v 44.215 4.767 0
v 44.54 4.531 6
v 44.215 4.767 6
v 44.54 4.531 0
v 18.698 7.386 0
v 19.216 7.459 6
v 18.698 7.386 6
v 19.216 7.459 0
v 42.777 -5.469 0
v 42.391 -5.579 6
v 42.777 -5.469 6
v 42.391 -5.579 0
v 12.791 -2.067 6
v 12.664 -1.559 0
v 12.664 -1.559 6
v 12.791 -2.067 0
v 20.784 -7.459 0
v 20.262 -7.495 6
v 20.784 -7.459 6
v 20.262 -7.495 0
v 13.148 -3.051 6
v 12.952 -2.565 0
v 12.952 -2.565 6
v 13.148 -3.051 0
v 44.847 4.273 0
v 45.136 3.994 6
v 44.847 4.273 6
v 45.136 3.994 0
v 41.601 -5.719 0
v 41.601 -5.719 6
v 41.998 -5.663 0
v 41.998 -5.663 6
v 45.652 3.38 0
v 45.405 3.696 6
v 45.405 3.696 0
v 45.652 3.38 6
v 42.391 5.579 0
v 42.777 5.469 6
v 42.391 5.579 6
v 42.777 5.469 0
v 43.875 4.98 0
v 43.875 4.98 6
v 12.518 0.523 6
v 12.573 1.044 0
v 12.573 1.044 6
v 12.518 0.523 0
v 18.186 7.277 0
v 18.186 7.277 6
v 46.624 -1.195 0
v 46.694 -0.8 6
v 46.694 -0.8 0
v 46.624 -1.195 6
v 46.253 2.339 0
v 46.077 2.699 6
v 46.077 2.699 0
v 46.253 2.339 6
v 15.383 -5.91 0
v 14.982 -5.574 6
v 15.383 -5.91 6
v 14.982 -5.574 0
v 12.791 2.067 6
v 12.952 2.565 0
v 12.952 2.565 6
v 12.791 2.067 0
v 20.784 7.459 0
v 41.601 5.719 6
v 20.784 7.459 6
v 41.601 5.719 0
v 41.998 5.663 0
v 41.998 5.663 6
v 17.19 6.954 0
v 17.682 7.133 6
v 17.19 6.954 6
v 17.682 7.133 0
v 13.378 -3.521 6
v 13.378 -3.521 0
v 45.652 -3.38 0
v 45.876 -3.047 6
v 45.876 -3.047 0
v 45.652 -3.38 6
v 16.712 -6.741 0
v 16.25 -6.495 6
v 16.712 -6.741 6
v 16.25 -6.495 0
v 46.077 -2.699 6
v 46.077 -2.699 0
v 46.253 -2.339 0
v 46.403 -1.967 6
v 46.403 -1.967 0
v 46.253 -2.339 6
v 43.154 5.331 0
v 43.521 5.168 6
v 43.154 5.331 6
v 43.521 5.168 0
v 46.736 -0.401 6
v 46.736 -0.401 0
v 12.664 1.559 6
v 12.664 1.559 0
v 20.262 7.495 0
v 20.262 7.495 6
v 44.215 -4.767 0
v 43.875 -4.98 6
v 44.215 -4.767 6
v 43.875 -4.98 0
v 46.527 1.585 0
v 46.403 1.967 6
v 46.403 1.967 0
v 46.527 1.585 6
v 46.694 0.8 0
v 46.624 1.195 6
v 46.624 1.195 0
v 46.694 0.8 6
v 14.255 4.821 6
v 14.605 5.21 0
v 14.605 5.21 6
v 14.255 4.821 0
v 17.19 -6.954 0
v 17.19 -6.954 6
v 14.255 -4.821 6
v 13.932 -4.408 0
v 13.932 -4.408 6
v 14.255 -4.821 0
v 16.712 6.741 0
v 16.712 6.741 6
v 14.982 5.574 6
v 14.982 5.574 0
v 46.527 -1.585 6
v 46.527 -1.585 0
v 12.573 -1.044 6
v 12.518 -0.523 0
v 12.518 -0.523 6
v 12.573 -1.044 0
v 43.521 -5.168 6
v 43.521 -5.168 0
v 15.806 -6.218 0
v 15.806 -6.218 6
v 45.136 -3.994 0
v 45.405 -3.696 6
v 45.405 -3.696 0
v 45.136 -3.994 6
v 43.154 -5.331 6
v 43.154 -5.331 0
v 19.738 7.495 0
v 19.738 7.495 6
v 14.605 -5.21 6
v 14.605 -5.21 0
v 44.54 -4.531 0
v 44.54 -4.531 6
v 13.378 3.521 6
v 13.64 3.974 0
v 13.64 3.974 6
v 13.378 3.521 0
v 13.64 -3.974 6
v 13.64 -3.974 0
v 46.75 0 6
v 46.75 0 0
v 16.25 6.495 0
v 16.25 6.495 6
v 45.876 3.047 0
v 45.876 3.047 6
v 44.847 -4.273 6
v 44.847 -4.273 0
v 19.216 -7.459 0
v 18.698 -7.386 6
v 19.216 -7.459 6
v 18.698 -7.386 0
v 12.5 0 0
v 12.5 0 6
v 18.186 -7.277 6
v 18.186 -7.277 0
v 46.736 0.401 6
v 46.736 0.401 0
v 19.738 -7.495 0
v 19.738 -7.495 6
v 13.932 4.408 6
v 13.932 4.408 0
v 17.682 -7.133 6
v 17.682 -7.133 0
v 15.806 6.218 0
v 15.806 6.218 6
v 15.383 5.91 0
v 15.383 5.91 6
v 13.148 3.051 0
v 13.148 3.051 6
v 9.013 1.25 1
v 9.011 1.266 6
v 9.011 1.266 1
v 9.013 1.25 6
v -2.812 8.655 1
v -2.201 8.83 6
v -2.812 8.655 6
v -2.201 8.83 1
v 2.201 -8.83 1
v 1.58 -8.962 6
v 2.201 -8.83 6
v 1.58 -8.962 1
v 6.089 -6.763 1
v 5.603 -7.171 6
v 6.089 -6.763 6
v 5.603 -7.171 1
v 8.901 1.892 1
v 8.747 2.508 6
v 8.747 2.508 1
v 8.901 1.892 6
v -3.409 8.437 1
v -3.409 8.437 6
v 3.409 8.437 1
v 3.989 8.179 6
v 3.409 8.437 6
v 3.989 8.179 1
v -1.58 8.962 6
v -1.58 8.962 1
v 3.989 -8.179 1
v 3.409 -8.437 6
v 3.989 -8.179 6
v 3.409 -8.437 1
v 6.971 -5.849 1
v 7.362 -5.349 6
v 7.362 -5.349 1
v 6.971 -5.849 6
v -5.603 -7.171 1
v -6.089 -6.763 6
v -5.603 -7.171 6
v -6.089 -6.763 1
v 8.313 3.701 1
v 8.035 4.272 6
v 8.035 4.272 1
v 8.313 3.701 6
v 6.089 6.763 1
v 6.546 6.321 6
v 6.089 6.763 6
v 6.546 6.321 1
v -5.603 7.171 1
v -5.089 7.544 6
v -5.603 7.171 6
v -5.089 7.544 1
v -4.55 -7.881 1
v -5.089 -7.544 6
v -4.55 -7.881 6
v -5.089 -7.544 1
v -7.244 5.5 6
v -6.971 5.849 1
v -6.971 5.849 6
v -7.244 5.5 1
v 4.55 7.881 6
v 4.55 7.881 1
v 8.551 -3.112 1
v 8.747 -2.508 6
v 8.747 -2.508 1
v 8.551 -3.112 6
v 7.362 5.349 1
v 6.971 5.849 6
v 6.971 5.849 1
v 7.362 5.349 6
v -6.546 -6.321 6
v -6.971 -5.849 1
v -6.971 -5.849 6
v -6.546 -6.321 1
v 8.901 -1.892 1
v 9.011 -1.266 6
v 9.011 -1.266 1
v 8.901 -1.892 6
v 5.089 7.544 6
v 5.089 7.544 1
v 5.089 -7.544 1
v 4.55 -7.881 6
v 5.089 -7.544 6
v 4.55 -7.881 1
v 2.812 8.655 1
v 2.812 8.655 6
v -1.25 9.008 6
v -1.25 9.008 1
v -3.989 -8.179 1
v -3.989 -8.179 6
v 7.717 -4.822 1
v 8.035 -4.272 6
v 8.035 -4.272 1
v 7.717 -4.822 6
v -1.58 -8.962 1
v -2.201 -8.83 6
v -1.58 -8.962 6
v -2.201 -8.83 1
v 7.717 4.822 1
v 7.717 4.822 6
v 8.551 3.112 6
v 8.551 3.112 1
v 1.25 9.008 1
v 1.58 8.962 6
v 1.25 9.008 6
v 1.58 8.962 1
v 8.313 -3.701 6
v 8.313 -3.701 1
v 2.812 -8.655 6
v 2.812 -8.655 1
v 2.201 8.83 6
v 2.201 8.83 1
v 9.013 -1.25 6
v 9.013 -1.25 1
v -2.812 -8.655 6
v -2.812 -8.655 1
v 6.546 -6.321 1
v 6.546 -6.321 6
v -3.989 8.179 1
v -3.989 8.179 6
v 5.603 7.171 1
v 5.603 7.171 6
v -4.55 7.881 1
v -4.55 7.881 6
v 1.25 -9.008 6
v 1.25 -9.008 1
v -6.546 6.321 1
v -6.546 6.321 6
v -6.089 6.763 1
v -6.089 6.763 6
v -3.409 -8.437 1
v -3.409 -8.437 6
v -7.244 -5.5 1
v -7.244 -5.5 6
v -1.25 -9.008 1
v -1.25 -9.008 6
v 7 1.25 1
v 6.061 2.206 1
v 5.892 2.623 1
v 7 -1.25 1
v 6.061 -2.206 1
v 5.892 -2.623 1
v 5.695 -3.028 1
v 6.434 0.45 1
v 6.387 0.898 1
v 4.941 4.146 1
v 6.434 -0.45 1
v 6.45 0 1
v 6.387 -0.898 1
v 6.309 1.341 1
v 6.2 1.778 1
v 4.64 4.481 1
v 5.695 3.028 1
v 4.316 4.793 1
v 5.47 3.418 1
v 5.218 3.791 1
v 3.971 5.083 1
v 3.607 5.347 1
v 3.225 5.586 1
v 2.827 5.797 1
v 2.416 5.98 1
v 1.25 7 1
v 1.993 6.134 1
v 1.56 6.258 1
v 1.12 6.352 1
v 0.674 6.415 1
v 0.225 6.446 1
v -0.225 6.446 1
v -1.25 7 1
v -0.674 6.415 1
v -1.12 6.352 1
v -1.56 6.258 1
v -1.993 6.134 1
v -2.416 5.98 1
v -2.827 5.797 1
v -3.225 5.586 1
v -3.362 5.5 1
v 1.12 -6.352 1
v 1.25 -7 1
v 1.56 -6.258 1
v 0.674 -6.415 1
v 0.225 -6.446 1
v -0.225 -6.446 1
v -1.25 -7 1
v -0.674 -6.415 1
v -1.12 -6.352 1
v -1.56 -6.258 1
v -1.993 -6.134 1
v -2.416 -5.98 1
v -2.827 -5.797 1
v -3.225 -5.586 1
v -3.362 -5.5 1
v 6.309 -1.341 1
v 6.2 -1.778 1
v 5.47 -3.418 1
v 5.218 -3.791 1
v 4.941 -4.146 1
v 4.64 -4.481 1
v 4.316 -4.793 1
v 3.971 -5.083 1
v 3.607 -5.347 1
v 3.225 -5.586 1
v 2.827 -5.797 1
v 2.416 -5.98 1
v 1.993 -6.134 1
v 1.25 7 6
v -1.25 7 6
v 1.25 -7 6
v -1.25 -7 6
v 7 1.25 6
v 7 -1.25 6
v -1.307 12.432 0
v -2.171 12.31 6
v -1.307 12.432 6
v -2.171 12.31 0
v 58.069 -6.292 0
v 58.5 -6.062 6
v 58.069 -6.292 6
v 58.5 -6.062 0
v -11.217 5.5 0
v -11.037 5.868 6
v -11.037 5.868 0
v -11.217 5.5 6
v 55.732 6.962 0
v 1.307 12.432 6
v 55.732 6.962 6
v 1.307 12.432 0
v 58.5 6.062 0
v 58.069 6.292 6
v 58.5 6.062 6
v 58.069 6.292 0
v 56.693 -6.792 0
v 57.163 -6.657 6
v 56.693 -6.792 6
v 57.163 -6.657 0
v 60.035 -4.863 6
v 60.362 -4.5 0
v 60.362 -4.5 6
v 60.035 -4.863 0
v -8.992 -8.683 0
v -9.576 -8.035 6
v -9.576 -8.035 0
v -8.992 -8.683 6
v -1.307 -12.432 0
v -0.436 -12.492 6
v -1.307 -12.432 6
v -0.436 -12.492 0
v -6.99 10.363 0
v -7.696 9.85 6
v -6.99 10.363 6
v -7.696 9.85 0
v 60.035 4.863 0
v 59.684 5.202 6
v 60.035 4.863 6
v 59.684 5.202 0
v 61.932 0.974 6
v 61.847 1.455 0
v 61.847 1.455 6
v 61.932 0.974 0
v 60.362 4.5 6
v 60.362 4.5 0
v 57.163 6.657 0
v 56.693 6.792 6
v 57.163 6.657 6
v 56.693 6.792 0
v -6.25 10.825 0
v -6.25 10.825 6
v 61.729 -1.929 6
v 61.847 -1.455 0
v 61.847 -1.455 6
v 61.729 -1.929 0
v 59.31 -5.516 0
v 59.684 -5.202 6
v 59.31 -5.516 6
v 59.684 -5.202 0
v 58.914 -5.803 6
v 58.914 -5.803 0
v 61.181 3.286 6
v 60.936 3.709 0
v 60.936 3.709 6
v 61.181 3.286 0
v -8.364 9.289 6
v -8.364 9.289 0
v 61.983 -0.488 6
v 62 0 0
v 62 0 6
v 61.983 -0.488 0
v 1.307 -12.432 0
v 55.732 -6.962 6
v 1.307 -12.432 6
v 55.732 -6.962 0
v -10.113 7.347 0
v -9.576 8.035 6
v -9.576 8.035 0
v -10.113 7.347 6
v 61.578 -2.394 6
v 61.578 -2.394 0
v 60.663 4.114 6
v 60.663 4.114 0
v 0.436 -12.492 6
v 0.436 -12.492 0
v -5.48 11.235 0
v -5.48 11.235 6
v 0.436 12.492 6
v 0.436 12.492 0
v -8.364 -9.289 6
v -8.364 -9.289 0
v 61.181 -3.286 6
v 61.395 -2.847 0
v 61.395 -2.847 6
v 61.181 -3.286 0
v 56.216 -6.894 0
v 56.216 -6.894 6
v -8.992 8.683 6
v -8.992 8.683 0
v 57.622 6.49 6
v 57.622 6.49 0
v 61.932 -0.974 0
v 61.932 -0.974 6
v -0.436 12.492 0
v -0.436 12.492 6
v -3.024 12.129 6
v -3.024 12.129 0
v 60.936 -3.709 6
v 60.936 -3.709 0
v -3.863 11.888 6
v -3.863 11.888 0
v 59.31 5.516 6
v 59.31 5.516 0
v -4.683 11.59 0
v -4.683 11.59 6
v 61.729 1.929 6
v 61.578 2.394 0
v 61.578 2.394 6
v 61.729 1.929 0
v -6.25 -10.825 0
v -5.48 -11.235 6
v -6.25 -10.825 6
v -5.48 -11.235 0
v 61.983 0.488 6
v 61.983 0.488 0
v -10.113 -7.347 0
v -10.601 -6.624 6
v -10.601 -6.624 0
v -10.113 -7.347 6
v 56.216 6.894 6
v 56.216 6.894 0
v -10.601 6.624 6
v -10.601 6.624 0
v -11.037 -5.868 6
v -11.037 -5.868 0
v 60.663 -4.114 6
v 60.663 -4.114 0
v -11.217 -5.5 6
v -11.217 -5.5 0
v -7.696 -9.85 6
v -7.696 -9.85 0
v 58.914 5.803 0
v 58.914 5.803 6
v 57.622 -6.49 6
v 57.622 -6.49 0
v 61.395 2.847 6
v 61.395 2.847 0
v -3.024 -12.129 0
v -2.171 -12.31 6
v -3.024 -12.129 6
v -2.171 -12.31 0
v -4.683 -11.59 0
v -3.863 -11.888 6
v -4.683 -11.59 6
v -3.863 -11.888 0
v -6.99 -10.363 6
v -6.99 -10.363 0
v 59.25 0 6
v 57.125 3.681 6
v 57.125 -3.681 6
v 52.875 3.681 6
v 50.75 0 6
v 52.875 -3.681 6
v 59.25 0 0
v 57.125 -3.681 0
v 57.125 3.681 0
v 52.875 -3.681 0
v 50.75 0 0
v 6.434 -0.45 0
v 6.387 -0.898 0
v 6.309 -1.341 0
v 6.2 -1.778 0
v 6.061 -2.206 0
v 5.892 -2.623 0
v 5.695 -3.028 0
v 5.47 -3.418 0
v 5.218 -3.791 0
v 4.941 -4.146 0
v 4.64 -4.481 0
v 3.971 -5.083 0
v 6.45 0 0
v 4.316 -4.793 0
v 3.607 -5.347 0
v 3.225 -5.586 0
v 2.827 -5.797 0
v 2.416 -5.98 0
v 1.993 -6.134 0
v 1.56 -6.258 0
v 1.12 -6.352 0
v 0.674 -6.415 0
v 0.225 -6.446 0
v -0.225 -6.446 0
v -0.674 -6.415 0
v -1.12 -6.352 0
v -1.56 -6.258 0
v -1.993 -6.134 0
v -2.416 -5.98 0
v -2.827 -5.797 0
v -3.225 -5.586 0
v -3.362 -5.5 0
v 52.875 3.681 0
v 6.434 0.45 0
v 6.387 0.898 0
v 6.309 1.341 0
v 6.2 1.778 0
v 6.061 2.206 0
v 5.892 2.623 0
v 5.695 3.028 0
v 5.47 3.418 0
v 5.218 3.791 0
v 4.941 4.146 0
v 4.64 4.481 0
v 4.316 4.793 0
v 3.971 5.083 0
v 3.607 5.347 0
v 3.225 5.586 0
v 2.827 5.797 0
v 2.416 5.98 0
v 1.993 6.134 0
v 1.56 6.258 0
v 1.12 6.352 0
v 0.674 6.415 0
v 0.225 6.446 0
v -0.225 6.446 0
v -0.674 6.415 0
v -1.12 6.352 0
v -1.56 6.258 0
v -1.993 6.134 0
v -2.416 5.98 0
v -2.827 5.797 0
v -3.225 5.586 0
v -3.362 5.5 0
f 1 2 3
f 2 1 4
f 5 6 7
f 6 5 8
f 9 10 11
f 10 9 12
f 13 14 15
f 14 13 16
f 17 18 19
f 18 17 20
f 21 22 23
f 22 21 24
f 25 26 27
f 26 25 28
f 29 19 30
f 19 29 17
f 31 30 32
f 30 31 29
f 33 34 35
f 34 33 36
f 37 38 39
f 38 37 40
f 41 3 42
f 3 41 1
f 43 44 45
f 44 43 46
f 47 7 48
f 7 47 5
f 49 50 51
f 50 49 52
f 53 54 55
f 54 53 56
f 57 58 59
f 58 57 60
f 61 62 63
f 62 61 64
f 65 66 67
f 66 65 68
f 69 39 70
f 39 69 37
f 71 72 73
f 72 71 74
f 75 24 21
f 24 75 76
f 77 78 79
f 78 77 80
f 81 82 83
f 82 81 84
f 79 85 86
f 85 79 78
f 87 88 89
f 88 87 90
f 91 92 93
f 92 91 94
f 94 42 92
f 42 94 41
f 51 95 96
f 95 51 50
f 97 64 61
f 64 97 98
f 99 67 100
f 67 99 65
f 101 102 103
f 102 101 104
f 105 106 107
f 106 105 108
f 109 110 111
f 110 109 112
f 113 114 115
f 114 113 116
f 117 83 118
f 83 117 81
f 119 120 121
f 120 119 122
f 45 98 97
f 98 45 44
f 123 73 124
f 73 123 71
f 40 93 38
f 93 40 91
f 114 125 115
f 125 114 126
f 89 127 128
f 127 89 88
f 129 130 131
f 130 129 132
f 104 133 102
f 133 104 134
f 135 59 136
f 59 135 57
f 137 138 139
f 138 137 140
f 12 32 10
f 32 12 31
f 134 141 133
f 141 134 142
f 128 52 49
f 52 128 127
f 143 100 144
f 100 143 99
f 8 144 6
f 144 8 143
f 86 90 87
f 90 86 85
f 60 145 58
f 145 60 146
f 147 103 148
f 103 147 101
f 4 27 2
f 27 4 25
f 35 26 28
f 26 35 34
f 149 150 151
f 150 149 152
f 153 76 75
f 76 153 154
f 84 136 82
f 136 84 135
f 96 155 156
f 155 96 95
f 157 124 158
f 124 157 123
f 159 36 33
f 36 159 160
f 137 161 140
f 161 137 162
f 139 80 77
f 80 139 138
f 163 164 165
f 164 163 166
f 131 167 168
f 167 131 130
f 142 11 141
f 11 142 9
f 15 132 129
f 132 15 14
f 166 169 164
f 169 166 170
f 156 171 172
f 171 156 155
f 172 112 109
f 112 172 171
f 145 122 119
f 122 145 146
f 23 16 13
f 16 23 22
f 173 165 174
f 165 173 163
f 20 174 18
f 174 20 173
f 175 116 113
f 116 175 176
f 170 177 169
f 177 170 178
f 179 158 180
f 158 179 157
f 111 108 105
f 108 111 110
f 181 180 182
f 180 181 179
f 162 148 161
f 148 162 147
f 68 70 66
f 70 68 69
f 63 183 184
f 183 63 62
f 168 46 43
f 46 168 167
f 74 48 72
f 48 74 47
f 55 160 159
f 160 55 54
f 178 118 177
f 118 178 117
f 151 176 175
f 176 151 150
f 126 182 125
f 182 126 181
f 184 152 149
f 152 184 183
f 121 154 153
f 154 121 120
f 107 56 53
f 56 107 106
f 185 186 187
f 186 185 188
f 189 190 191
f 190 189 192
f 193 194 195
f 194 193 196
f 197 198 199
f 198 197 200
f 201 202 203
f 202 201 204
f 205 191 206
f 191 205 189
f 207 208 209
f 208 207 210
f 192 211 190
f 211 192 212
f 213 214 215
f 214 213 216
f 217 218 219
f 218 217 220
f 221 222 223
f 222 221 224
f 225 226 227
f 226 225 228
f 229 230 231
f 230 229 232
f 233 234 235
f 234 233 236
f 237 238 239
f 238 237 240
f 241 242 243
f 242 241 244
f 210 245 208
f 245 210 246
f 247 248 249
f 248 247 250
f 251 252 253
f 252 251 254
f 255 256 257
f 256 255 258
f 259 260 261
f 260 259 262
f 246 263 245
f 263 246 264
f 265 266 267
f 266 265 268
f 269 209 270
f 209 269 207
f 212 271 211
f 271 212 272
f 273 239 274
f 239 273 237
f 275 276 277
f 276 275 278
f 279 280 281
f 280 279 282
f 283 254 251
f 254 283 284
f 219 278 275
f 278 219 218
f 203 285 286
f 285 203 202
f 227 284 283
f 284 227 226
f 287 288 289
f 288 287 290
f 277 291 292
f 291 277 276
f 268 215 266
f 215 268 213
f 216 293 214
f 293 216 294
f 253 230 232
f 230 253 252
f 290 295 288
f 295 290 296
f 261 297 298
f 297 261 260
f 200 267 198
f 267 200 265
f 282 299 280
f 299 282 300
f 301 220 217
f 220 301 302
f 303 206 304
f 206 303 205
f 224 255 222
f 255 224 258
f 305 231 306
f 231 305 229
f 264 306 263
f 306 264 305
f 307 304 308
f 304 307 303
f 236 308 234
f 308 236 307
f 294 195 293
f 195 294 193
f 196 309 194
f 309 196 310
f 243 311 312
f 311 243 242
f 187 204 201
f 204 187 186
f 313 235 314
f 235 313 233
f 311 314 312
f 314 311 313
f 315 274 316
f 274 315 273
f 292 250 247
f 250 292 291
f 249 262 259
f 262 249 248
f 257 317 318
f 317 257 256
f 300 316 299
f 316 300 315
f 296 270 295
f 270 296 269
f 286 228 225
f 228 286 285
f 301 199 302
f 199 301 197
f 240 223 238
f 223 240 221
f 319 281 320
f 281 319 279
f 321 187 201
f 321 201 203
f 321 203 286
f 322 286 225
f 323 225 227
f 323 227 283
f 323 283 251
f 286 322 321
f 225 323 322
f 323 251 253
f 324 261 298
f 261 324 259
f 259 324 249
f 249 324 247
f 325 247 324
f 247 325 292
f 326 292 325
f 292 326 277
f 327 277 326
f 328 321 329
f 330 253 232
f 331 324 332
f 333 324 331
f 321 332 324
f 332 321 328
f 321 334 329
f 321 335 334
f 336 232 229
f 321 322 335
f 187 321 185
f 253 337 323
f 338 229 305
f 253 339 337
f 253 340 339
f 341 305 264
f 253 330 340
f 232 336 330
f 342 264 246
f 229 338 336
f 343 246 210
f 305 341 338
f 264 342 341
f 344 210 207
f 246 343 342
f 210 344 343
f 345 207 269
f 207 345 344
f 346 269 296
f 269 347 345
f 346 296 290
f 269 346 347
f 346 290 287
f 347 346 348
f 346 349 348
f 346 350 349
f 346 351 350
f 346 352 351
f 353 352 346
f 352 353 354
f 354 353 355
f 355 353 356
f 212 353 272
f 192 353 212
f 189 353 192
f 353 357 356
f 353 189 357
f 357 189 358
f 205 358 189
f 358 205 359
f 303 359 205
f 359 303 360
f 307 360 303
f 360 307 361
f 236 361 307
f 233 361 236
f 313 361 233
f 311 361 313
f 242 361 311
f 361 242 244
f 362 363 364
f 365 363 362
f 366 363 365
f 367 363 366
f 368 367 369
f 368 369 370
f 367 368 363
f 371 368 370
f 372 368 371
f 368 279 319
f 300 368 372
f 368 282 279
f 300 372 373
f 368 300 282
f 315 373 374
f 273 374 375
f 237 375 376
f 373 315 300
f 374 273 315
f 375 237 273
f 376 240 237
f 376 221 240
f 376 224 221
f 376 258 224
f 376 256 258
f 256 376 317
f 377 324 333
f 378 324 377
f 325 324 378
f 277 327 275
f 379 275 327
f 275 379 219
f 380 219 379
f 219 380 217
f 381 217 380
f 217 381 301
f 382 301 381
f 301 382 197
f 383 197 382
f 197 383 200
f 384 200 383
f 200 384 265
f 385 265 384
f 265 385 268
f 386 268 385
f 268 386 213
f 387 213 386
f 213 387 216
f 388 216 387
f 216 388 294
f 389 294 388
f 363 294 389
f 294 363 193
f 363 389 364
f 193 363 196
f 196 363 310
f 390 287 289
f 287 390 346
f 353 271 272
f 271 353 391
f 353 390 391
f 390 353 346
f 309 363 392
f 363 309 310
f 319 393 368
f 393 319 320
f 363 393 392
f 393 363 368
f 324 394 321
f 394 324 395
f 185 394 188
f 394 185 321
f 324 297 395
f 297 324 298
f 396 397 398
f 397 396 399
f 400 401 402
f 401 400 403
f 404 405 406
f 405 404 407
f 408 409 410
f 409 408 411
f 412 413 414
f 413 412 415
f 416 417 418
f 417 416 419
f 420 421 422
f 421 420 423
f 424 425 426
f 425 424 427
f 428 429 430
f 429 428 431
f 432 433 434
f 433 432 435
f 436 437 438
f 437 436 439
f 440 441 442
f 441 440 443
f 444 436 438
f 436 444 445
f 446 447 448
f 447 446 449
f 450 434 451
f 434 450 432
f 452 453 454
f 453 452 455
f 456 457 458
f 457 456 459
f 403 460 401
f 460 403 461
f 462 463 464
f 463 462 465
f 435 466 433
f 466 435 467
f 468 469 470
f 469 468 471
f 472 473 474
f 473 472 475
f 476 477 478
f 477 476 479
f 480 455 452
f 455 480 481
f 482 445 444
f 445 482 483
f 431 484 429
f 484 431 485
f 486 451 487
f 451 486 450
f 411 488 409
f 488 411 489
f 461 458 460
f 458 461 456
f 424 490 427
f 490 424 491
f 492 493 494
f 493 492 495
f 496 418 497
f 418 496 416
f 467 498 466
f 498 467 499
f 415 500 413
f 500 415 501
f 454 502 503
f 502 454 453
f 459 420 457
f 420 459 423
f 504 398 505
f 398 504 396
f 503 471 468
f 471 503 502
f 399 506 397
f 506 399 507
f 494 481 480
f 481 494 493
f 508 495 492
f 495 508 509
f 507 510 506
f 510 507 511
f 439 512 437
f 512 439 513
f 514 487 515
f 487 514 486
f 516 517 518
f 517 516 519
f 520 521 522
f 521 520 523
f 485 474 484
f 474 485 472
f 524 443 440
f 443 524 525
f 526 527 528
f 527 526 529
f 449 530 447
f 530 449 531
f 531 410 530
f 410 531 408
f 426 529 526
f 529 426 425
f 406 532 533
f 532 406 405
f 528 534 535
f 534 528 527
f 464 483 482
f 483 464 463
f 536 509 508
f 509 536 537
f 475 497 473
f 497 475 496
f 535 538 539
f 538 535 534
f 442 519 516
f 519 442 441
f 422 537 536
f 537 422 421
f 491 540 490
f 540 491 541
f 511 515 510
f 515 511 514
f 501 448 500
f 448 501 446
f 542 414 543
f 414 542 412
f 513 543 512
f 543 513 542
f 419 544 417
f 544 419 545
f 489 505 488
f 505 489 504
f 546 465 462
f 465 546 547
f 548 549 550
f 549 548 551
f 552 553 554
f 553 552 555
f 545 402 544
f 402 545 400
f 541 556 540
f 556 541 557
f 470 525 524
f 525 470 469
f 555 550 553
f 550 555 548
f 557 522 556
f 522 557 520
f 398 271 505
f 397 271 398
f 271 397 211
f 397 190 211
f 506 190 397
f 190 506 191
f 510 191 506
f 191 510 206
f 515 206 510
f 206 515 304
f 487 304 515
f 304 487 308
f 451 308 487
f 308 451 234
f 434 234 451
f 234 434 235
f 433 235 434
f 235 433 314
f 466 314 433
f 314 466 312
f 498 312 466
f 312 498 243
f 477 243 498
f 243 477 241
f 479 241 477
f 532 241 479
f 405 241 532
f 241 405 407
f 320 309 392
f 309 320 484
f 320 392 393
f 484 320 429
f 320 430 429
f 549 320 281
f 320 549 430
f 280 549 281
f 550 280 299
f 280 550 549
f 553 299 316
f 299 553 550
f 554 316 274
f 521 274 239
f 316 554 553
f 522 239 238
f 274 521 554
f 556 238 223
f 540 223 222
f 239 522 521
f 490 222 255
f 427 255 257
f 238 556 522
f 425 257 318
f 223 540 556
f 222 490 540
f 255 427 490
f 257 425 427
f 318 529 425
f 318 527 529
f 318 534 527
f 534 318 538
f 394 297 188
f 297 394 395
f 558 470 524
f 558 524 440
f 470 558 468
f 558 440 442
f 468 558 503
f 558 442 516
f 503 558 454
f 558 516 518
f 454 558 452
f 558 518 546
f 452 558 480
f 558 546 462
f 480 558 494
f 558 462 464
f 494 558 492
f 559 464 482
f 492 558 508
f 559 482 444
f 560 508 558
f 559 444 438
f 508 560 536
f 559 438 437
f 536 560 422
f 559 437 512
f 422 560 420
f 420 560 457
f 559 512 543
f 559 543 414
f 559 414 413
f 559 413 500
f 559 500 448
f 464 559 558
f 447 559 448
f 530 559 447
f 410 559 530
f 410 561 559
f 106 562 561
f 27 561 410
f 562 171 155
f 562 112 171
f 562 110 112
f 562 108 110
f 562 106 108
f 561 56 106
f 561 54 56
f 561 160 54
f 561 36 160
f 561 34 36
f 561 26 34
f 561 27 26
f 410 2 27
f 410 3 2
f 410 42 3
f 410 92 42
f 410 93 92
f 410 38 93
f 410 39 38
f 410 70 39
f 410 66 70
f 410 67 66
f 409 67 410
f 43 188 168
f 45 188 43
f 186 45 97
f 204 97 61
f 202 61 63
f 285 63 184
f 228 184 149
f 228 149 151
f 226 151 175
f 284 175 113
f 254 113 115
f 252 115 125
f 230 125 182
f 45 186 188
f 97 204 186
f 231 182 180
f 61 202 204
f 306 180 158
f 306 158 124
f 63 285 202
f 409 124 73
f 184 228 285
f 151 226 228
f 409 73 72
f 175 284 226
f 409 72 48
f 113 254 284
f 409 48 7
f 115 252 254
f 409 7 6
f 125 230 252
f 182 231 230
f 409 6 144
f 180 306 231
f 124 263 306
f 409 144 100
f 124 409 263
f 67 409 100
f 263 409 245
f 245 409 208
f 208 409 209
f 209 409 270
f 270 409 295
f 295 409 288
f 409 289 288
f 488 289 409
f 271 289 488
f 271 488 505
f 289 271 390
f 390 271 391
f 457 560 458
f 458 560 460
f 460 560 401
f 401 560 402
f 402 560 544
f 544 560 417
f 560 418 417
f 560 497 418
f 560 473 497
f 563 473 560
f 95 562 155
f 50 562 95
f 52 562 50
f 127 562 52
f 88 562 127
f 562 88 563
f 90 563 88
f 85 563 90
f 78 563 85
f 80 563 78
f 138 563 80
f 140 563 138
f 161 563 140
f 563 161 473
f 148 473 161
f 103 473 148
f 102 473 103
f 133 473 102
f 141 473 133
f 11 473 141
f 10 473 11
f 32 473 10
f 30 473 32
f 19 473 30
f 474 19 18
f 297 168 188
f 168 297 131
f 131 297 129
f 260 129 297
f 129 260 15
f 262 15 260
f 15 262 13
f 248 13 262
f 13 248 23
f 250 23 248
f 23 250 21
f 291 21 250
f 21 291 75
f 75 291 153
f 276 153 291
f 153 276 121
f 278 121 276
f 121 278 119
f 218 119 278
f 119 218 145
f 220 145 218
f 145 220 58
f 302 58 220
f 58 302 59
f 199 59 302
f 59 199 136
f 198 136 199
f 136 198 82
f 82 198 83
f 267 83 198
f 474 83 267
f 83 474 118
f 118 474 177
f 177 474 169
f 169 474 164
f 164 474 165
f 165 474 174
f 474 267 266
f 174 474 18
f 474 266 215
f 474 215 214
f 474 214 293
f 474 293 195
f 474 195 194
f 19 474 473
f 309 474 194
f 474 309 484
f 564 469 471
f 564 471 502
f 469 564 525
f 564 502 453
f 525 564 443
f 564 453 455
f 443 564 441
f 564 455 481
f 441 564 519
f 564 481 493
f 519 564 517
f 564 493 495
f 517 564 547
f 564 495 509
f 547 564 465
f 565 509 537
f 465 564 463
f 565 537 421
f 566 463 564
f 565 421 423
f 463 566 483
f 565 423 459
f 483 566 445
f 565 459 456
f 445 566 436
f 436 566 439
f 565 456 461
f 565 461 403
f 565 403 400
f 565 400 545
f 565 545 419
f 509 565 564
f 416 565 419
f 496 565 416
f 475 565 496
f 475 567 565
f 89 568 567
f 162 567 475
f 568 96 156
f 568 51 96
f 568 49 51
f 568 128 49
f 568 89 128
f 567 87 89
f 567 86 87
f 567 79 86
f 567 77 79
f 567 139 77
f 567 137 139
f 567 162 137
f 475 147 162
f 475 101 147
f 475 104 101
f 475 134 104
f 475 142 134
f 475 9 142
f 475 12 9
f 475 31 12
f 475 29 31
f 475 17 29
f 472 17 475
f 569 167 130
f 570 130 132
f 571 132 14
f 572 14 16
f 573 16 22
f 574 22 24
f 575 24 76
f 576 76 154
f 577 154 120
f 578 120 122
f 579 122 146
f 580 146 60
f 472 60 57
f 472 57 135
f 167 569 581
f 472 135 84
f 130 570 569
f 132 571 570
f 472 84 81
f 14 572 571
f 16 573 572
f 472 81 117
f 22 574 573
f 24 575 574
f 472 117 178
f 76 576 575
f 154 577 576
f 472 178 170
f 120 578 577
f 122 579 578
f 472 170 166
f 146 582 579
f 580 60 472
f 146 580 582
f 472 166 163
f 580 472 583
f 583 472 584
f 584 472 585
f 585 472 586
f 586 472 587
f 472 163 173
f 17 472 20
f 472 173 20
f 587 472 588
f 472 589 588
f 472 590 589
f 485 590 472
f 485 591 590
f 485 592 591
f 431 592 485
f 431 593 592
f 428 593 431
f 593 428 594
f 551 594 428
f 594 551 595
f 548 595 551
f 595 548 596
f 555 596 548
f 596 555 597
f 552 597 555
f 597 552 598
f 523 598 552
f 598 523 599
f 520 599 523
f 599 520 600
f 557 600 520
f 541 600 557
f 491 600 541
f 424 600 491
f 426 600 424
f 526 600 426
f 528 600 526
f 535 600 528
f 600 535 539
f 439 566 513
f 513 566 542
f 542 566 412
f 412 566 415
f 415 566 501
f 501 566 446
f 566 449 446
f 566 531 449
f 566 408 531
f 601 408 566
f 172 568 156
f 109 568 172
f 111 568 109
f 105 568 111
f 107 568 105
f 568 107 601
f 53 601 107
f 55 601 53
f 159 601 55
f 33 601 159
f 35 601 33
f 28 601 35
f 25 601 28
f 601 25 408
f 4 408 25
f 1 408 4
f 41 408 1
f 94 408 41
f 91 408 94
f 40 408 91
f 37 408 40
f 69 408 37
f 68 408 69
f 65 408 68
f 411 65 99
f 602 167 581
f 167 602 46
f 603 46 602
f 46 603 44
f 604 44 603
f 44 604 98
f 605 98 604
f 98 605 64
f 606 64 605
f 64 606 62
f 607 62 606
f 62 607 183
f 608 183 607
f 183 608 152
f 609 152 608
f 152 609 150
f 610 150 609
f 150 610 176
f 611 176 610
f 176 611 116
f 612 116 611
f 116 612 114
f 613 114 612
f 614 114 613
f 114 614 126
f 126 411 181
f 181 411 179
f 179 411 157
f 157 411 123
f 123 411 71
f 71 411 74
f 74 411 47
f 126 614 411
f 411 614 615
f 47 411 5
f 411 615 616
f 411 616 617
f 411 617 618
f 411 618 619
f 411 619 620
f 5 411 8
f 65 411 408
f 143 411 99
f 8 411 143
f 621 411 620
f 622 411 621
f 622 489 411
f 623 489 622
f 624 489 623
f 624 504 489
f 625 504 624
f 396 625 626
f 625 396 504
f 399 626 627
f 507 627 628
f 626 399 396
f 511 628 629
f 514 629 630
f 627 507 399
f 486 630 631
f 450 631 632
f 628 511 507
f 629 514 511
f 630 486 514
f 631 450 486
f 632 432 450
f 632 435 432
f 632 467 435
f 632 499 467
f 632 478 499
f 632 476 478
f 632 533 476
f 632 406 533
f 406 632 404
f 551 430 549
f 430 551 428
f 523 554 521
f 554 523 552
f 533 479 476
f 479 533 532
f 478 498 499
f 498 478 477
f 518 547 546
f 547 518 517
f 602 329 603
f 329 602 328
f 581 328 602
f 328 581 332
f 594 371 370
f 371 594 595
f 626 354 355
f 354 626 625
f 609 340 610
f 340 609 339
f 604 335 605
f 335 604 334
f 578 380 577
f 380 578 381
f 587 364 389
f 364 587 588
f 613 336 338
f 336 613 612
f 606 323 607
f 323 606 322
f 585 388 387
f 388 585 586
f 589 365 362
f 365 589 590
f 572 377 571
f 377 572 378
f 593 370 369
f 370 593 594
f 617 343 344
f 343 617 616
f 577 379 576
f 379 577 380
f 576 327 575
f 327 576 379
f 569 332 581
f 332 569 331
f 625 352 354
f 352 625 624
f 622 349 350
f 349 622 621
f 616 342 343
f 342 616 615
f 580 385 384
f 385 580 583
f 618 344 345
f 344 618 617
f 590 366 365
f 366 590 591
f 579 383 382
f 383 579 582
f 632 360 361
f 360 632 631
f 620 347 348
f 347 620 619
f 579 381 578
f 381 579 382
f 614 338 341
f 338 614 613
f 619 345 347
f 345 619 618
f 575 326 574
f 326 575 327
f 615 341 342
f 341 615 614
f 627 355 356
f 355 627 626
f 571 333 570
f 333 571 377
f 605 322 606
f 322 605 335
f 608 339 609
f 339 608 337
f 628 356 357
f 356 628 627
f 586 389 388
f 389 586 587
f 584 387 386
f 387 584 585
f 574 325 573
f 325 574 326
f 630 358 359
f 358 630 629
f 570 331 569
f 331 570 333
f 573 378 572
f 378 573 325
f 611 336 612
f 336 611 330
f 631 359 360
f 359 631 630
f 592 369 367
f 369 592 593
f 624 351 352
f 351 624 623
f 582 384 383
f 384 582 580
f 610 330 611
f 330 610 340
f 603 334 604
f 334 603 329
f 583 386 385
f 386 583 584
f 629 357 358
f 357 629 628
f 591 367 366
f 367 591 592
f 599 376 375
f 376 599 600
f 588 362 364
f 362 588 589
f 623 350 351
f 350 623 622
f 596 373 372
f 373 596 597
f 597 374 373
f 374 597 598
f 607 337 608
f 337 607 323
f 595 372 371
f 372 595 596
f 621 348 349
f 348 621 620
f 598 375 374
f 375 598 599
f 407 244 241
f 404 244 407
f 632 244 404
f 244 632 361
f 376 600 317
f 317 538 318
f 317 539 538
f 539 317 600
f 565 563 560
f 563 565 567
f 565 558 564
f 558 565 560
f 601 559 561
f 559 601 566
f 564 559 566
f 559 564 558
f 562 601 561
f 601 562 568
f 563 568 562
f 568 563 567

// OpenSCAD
$fn=90;



difference(){
    hull(){
        cylinder(d=25,h=6);    
        translate([55,0,0])
        cylinder(d=14,h=6);    
    }
    
    difference(){
        hull(){            
            translate([20,0,-1])
            cylinder(d=15,h=8);
            translate([41,0,-1])
            cylinder(d=11.5,h=8);
        }
        translate([3.5,0,0])
        cylinder(d=18,h=10);
    }
    
    translate([0,0,-2])
    cylinder(d=12.9,h=10);
    translate([-20,-5.5,-2])
    cube([20,11,10]);
    
    translate([0,0,1])
    difference(){
        cylinder(d=18.2,h=10);
        translate([-1.25,7,0])        
        cube([2.5,6.05,8]);
        translate([-1.25,-6.05-7,0])        
        cube([2.5,6.05,8]);        
        translate([7,-1.25,0])        
        cube([6.05,2.5,8]);
        
    }
    translate([55,0,-3])
    cylinder(d=8.5,h=10,$fn=6);
    
    //#translate([12,-50,-50])
    //cube([100,100,100]);
}
